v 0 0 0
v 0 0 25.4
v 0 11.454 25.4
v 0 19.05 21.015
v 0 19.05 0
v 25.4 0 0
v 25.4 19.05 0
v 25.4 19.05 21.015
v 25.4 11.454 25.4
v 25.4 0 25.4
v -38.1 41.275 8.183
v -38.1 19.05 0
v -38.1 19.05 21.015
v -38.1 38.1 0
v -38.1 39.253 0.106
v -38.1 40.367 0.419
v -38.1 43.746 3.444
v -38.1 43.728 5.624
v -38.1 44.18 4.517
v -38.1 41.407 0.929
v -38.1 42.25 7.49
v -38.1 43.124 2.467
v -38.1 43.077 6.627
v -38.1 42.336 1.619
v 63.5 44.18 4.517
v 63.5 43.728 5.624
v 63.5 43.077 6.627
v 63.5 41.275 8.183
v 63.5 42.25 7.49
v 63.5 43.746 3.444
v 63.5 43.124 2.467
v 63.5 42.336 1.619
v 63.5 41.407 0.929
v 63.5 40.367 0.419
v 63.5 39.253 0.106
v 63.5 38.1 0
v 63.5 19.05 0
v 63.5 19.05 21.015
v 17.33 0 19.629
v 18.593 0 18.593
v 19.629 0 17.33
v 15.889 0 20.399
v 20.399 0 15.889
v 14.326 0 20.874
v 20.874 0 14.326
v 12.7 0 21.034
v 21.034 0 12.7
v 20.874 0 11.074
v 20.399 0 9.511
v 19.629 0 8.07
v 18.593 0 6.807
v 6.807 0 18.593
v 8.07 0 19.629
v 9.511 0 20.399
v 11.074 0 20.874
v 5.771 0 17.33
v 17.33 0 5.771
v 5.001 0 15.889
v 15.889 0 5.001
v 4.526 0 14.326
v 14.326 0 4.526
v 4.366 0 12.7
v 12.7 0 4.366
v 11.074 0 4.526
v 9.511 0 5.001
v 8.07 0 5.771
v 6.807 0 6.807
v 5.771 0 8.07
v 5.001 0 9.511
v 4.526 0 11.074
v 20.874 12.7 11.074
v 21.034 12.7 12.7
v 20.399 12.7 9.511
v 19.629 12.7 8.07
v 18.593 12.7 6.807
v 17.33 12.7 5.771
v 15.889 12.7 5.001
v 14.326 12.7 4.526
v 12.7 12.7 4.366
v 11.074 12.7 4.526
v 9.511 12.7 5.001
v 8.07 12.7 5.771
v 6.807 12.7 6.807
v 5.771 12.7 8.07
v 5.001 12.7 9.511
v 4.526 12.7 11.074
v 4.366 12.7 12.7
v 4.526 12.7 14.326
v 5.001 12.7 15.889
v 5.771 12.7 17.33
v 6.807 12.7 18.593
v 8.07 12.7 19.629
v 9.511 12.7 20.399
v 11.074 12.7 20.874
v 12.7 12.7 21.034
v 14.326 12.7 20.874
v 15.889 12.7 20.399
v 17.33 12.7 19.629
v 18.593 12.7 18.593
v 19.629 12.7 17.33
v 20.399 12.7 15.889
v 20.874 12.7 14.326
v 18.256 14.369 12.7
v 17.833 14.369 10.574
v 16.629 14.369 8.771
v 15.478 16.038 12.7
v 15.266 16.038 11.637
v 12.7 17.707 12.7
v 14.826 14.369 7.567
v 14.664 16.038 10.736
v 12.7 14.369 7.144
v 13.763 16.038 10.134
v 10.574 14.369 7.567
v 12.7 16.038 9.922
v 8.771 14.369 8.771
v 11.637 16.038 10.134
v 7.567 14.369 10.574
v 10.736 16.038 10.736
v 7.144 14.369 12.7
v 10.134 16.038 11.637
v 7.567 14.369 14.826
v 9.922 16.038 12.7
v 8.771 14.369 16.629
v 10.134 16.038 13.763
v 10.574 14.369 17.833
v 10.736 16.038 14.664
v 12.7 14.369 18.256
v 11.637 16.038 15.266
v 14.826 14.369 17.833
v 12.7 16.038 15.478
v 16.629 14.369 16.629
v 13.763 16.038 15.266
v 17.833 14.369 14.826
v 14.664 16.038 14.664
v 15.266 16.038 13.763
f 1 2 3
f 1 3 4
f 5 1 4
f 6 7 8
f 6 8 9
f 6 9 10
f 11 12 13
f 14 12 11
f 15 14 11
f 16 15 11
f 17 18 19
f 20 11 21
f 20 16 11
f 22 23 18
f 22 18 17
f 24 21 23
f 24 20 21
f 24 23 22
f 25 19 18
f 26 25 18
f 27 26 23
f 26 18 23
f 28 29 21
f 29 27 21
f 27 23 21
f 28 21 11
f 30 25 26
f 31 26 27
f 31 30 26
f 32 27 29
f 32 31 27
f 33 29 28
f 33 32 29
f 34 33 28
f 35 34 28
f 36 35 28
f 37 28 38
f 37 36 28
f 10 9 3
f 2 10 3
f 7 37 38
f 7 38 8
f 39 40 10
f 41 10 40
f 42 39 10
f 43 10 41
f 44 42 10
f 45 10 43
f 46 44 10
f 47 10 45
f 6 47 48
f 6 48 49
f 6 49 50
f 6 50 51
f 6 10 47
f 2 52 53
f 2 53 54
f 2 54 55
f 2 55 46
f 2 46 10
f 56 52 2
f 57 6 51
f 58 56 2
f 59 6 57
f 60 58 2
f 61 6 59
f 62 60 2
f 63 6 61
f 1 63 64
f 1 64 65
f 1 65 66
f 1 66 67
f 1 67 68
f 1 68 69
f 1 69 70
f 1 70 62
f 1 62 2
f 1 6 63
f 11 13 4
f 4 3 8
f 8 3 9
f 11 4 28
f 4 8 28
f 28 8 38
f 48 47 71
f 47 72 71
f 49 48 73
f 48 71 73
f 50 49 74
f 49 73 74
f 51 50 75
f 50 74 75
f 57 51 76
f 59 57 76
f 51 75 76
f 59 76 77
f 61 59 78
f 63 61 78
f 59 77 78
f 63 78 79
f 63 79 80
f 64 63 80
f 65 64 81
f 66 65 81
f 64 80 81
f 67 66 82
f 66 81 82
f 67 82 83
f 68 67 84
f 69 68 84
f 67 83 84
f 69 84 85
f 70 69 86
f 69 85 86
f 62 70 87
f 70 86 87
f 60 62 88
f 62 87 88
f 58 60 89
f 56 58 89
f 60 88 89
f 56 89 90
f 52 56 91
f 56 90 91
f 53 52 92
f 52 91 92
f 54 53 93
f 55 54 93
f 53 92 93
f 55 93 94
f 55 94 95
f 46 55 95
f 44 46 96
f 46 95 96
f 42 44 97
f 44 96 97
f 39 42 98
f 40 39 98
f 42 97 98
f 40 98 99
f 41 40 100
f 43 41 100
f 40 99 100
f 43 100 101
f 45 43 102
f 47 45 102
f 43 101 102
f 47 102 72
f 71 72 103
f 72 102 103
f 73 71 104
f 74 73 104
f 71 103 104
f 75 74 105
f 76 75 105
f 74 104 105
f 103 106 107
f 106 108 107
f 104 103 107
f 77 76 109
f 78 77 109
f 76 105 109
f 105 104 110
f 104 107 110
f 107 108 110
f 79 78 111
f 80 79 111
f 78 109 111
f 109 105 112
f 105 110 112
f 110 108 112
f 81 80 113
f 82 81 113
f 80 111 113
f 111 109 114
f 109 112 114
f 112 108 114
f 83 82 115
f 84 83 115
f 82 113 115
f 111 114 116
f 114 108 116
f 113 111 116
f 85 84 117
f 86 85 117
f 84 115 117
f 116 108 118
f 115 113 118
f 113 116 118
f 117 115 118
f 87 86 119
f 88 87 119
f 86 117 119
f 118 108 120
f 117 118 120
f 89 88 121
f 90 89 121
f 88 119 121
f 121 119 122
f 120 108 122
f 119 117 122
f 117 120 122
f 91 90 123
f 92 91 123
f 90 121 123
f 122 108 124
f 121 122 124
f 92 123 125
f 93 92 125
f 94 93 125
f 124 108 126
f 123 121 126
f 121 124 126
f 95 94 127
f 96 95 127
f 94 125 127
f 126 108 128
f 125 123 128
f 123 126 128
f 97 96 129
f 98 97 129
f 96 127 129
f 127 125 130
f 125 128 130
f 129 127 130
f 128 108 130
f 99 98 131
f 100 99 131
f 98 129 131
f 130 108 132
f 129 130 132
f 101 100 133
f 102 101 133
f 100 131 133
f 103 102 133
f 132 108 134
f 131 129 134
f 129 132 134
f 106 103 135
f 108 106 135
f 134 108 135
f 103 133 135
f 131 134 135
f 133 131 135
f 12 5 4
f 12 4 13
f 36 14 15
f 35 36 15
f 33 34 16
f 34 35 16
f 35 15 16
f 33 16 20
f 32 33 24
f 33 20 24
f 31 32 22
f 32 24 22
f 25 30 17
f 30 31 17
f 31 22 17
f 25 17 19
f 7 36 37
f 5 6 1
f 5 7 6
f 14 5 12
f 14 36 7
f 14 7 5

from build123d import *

# Parameters (mm, degrees)
BOSS_EXTRUDE1_DEPTH = 25.4
CHAMFER1_SIZE       = 19.05
CHAMFER1_SIZE2      = 32.995567884
FILLET1_R           = 6.35


# Read off the part's stored shape, not the designer's step: AdvancedHole1
with BuildPart() as part:
    # Sketch1 → Boss-Extrude1 (new body)
    with BuildSketch(Plane.XY):
        Polygon((0, 0), (0, 19.05), (-38.1, 19.05), (-38.1, 44.45), (63.5, 44.45), (63.5, 19.05), (25.4, 19.05), (25.4, 0), align=None)
    extrude(amount=BOSS_EXTRUDE1_DEPTH)

    # Chamfer1
    chamfer1_edges = [part.edges().sort_by_distance(p)[0] for p in [
        (12.7, 44.45, 25.4),
    ]]
    chamfer1_side = [part.faces().sort_by_distance(p)[0] for p in [
        (12.7, 44.45, 12.7),
    ]]
    chamfer(chamfer1_edges, length=CHAMFER1_SIZE, length2=CHAMFER1_SIZE2, reference=chamfer1_side[0])

    # Fillet1
    # the kernel refuses this fillet: 6.35 mm, written as the material it takes off along each edge
    with BuildSketch(Plane(origin=(-53.975, 44.45, 0), x_dir=(0, -1, 0), z_dir=(1, 0, 0))) as fillet1_piece_1:
        with BuildLine():
            CenterArc((FILLET1_R, -FILLET1_R), FILLET1_R, 90, 90)
            Line((0, -FILLET1_R), (0, 0))
            Line((0, 0), (FILLET1_R, 0))
        make_face()
    extrude(amount=133.35, mode=Mode.SUBTRACT)
    with BuildSketch(Plane(origin=(-47.265435523, 44.45, 6.35), x_dir=(0, -0.8660254037844407, 0.49999999999999656), z_dir=(1, 0, 0))) as fillet1_piece_2:
        with BuildLine():
            CenterArc((FILLET1_R * 0.57735026919, FILLET1_R), FILLET1_R, 210, 60)
            Line((-FILLET1_R * 0.288675134595, FILLET1_R * 0.5), (0, 0))
            Line((0, 0), (FILLET1_R * 0.57735026919, 0))
        make_face()
    extrude(amount=119.930871047, mode=Mode.SUBTRACT)

    # AdvancedHole1 outline → AdvancedHole1 (revolve, cut)
    with BuildSketch(Plane(origin=(12.7, 0, 12.7), x_dir=(1, 0, 0), z_dir=(0, 0, 1))):
        Polygon((8.33374, 0), (8.33374, 12.7), (0, 17.707416175), (0, 0), align=None)
    revolve(axis=Axis((12.7, 0, 12.7), (0, 1, 0)), mode=Mode.SUBTRACT)


solid = part.part
